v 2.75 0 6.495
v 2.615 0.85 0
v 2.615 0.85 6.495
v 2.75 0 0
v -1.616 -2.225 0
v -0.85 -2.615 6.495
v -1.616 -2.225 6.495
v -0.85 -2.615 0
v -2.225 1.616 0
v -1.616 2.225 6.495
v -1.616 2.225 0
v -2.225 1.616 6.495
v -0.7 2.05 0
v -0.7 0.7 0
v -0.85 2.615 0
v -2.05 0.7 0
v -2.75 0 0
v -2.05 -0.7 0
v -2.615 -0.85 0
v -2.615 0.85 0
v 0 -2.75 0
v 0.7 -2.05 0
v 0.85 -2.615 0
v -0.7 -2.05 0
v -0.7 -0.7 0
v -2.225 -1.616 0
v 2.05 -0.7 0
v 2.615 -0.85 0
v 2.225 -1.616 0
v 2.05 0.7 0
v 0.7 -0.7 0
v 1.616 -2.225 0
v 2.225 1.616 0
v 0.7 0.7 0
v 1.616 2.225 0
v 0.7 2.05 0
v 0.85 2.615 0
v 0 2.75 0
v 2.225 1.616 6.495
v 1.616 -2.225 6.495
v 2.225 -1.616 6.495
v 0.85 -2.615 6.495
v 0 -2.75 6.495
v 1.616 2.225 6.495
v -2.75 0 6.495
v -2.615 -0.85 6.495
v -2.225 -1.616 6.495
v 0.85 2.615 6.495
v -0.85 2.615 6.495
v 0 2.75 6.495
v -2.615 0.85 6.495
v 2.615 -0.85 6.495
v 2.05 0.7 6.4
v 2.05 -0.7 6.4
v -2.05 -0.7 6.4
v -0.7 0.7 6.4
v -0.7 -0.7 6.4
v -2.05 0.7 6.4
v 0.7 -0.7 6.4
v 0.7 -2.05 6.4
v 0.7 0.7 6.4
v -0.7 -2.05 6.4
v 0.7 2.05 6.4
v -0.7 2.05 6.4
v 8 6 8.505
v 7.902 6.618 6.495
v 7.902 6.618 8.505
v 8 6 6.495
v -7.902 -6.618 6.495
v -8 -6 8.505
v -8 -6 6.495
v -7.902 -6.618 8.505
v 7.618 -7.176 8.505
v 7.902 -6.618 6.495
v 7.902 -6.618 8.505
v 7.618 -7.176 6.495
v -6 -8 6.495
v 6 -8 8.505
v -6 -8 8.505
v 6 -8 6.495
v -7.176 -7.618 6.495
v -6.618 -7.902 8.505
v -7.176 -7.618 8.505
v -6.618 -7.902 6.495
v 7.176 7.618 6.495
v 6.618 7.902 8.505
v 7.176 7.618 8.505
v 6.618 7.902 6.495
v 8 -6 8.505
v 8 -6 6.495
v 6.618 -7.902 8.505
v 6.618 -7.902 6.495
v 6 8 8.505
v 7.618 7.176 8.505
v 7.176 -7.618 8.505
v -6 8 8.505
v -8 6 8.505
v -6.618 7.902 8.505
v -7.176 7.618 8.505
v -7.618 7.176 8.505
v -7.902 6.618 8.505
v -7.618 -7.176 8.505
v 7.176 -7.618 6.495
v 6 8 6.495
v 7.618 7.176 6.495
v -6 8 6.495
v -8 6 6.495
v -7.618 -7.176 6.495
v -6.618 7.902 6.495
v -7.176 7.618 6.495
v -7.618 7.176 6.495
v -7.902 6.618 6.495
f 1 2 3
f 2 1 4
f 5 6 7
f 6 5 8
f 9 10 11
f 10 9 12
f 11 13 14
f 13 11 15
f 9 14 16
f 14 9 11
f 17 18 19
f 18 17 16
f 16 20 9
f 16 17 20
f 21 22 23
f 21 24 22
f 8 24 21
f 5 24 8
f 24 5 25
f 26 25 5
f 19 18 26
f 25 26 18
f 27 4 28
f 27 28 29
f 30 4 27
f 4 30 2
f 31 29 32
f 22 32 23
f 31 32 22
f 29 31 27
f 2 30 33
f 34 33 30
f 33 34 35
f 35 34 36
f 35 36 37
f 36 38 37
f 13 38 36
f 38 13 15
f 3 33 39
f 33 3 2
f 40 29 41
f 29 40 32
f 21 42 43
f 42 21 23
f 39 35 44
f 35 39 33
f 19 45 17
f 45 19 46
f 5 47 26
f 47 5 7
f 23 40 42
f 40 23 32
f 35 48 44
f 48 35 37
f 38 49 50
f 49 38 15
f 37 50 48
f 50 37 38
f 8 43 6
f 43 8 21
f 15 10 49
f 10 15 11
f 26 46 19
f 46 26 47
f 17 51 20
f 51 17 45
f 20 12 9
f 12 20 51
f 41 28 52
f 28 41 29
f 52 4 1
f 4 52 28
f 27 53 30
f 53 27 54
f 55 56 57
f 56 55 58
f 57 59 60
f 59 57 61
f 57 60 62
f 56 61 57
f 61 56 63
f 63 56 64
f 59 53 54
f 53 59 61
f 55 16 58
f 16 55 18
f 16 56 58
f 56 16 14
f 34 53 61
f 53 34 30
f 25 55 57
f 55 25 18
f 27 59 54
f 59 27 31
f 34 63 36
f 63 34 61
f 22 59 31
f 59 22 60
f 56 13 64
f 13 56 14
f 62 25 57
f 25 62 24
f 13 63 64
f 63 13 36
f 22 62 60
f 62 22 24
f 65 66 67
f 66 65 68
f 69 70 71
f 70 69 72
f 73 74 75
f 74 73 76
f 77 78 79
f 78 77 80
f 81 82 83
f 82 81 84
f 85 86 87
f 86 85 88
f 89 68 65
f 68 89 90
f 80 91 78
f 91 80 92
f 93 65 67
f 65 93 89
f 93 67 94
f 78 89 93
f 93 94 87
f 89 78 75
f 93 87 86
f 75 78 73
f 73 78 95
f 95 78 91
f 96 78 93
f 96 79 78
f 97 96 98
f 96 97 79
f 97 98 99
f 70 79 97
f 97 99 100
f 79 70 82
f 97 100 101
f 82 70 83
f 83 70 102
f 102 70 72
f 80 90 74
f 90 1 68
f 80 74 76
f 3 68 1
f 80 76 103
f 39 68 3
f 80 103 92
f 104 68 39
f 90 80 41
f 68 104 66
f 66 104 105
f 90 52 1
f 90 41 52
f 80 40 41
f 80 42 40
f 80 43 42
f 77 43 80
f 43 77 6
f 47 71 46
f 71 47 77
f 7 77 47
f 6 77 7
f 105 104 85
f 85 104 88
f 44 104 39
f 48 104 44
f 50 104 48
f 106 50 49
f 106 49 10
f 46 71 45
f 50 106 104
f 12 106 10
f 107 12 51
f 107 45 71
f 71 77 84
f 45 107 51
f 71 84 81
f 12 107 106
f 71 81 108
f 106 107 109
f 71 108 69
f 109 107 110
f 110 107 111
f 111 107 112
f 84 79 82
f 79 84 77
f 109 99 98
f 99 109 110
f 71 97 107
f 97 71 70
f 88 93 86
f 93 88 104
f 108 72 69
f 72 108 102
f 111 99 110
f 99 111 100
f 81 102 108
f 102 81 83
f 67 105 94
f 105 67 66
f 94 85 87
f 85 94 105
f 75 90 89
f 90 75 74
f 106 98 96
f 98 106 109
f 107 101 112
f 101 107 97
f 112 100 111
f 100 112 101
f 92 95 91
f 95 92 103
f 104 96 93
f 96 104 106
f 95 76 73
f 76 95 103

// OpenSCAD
stem_height = 6.5;
top_side = 16;
cap_thickness = 2;
side_thickness = 1;
corner_radius = 2;
stem_diameter=5.5;

// I'm printing in my local library and don't have access to printer settings,
// So I have modified slots a little bit to make them tighter.
// Original dimensions were [4.2,1.5,40]
slot_length = 4.1;
slot_width = 1.4;
slots = [[slot_length,slot_width, stem_height], [slot_width,slot_length, stem_height]];

// TODO this should be a part of cap
/*translate([top_side/2-0.5, 0, stem_height-1.5]) cube([side_thickness, top_side-4, stem_height/2], center=true);*/

// cube([top_side, top_side, 15], center=true);
union() {
    minkowski() {
        translate([0, 0, stem_height])
            cube([top_side-corner_radius*2, top_side-corner_radius*2, 0.01], center=true);
        // sphere(r=corner_radius, $fn=20);
        cylinder(h=cap_thickness, r=corner_radius, $fn=20);
    }

    // stem height check
    // color("red") translate([8, 8, 0]) cylinder(h=stem_height, r=corner_radius, $fn=20);


    // stem
    difference() {
        cylinder(stem_height, d=stem_diameter, $fn=20);
        translate([0,0, stem_height/2-0.1]) cube(slots[0], center=true);
        translate([0,0, stem_height/2-0.1]) cube(slots[1], center=true);
    }
}
